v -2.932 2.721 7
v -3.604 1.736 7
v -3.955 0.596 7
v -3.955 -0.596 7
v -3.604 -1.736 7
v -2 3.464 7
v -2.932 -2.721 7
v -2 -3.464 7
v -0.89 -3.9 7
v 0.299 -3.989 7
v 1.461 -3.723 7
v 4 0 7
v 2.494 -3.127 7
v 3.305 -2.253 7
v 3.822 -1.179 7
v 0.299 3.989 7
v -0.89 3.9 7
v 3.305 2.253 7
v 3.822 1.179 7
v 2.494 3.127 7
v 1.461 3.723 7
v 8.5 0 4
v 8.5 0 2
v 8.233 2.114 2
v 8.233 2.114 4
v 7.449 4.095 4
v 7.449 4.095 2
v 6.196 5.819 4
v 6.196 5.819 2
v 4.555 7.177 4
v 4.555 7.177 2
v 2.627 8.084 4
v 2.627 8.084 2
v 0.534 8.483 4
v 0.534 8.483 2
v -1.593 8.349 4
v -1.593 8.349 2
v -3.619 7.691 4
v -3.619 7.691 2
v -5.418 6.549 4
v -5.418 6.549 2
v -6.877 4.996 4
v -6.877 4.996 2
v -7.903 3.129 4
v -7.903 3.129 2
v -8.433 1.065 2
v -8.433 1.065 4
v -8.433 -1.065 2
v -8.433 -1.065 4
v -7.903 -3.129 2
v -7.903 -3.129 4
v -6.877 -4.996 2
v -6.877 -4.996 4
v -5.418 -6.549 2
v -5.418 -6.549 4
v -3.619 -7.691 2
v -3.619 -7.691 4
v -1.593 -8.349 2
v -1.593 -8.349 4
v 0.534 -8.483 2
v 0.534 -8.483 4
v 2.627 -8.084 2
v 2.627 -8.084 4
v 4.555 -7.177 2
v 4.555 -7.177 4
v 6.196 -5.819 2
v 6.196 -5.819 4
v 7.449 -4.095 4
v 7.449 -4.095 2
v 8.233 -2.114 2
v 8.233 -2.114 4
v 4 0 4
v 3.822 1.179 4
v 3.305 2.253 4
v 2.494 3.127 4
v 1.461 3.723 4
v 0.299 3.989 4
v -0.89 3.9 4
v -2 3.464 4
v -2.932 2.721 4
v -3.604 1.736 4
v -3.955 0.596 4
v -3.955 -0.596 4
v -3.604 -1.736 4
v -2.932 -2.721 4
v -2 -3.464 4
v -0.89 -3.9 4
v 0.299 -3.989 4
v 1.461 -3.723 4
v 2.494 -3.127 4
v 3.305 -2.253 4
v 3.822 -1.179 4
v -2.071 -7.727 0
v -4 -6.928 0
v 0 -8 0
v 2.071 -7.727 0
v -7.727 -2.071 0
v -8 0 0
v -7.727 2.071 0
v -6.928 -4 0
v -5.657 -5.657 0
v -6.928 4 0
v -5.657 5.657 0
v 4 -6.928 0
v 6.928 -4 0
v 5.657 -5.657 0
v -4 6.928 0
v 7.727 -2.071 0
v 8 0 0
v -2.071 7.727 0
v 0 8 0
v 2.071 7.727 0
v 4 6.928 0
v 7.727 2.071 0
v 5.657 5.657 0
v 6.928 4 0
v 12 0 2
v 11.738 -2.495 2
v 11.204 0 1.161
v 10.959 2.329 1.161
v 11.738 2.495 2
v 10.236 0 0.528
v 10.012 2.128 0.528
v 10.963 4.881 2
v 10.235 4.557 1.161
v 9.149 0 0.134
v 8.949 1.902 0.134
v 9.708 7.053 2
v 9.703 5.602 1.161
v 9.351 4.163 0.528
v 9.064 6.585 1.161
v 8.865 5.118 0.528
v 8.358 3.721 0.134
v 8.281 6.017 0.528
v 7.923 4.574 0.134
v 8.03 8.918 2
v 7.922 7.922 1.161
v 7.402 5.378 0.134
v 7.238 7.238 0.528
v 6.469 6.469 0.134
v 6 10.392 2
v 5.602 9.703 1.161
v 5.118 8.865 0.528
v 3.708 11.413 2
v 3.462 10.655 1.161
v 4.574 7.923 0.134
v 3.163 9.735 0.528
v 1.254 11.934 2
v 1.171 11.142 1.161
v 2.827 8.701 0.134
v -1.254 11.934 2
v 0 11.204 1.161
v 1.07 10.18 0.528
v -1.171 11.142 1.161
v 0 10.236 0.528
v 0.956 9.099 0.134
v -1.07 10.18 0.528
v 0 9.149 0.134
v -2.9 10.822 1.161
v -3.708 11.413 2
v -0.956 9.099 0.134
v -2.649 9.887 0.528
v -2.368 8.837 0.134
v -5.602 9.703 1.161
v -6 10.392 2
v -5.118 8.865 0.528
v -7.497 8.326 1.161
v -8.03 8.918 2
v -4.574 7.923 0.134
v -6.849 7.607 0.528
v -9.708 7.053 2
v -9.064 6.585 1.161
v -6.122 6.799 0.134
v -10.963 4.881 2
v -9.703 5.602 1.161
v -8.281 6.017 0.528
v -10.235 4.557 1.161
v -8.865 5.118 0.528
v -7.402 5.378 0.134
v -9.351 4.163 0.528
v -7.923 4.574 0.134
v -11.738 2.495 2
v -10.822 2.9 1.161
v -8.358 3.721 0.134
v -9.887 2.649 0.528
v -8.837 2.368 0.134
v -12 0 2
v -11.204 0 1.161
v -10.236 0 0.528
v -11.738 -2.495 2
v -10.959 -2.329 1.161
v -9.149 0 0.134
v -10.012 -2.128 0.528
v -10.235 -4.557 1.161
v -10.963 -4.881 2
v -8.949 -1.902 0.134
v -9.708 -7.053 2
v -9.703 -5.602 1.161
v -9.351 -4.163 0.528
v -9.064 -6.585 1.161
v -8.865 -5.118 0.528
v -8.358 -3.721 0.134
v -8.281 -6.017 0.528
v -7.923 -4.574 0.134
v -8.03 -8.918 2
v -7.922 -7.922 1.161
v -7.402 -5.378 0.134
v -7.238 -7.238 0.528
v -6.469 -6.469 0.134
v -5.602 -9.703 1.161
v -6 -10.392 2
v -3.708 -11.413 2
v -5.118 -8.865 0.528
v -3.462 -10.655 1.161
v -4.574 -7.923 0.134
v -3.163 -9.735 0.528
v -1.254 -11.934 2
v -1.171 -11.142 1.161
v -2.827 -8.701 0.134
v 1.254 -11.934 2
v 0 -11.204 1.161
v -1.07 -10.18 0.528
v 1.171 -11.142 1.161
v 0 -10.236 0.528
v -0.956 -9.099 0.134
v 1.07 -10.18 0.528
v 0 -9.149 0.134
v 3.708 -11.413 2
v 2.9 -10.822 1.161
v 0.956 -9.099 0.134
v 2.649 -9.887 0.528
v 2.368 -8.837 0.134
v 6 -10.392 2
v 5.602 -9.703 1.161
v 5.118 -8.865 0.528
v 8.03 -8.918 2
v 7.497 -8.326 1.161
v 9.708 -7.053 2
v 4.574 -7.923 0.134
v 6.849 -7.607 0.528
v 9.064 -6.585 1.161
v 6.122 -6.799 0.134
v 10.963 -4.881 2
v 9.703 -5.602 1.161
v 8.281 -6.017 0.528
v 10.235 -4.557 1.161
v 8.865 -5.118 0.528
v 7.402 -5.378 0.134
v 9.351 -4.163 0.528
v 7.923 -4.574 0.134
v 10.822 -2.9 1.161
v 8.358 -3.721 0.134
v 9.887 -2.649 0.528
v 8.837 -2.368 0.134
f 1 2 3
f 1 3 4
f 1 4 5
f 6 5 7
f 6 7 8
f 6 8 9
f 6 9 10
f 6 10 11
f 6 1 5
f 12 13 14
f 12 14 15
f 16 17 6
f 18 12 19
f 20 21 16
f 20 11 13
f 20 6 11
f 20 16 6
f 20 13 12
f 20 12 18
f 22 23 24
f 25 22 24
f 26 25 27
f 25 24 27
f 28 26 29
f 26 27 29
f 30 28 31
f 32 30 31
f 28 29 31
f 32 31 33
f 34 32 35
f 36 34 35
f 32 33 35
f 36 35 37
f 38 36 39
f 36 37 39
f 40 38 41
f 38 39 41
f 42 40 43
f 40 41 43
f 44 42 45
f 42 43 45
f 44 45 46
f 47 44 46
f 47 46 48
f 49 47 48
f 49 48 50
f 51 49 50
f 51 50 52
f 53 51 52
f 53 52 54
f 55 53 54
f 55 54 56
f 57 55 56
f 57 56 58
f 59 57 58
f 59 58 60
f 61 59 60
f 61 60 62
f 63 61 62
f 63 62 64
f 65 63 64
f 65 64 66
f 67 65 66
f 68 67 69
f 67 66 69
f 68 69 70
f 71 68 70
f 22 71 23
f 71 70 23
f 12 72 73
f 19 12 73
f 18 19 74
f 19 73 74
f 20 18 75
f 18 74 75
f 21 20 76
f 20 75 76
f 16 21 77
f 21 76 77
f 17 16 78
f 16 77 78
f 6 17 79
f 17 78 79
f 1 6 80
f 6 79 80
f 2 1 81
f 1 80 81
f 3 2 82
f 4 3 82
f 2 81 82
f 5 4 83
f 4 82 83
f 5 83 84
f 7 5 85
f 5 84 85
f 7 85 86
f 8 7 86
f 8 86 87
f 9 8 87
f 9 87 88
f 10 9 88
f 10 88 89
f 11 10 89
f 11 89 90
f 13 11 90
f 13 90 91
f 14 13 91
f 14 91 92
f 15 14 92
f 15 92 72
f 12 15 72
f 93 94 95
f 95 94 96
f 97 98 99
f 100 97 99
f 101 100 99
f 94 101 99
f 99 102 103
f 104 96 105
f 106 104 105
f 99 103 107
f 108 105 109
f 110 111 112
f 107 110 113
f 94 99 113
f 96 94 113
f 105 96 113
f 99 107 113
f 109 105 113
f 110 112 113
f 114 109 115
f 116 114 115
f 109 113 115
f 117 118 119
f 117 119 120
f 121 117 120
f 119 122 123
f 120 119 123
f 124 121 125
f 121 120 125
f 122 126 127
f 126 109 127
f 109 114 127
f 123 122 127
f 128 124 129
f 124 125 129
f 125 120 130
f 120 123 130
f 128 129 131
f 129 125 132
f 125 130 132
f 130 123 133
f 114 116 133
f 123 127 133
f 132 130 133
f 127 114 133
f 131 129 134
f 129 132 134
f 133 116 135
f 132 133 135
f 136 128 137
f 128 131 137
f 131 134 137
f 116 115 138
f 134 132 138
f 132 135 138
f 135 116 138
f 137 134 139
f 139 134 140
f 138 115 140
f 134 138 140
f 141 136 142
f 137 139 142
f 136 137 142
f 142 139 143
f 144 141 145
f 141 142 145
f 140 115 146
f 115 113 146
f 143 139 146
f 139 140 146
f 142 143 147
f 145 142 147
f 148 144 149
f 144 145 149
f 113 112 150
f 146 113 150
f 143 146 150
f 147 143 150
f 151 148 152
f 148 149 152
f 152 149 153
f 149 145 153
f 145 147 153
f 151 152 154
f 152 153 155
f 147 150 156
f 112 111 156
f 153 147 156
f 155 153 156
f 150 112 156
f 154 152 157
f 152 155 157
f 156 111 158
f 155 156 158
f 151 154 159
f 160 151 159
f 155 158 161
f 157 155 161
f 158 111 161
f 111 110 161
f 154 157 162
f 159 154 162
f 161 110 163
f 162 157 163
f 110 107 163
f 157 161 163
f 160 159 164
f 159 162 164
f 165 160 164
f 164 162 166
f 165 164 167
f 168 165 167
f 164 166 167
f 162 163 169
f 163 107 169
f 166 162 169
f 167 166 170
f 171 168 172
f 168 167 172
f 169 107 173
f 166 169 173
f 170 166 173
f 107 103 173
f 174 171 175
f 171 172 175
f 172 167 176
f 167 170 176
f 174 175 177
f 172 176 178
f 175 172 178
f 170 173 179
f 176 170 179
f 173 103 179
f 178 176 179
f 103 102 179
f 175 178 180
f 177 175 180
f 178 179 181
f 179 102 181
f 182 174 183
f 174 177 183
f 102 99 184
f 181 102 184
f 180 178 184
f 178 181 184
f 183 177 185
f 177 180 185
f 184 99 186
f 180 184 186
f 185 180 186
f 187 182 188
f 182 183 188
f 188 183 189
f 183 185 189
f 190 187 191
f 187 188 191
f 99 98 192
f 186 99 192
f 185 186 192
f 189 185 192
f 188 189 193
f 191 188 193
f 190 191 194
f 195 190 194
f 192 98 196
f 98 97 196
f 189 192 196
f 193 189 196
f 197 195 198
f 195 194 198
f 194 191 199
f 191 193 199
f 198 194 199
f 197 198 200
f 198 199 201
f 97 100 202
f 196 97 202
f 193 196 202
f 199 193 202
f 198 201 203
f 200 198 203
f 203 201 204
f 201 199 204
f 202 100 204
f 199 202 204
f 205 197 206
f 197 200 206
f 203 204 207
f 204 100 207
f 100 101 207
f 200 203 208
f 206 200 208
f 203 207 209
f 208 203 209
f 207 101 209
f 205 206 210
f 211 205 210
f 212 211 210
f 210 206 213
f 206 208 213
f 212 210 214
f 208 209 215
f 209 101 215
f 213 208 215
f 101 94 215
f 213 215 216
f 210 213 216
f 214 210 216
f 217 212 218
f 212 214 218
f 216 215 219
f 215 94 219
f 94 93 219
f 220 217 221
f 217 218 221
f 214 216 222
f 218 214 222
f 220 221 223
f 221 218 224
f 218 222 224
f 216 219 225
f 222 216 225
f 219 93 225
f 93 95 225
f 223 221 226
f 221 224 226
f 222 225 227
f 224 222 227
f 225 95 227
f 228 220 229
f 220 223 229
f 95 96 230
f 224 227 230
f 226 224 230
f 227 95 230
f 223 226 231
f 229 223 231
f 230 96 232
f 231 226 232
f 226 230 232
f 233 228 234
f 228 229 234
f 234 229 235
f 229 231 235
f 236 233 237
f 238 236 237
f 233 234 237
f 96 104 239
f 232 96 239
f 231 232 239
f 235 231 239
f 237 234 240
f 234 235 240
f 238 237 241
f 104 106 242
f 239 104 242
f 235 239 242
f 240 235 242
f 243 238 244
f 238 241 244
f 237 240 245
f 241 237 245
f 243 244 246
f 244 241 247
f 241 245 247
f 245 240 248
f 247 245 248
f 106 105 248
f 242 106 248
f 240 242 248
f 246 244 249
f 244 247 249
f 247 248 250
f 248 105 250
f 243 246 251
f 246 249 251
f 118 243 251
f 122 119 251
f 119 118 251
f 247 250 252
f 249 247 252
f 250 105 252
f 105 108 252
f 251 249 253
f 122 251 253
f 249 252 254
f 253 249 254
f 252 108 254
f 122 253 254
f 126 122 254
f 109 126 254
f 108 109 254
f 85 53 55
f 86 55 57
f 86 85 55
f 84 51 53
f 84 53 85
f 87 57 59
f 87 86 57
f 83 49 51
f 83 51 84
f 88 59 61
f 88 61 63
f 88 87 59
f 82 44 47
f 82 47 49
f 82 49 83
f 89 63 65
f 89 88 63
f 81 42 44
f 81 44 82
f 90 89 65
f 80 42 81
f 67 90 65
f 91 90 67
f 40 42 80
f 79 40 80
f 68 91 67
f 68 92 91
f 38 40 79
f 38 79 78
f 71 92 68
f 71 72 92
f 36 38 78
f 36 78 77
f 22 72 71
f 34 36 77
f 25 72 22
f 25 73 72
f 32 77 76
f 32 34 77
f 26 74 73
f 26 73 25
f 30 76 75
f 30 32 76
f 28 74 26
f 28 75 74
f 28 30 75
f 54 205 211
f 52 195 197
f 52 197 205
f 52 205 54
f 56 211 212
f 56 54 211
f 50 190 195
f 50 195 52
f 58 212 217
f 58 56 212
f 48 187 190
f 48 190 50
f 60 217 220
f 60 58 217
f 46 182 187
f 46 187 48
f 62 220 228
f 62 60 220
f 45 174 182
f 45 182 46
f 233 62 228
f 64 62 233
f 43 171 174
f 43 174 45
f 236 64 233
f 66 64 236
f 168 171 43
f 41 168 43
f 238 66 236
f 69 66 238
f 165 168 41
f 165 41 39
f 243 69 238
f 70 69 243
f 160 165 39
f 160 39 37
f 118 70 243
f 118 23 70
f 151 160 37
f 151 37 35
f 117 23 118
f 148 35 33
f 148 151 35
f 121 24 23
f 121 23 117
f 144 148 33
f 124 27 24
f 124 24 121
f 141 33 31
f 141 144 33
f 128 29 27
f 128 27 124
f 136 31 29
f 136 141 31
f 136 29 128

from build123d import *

# Parameters (mm, degrees)
F0_R     = 12
F0_R_2   = 8.5
F1_DEPTH = 2
F0_R_3   = 4
F2_DEPTH = 4
F3_DEPTH = 7


# Not quite as in the source:
# - a fillet or chamfer that OpenCascade refuses, or shapes differently, is made with other operations: its cross-section is extruded or revolved along the edge and cut away or added


with BuildPart() as f1:
    # F0 (on Top) → F1 (new body)
    with BuildSketch(Plane.XY):
        Circle(F0_R)
        Circle(F0_R_2, mode=Mode.SUBTRACT)
    extrude(amount=F1_DEPTH)

    # F0 (on Top) → F2 (join)
    with BuildSketch(Plane.XY):
        Circle(F0_R_2)
        Circle(F0_R_3, mode=Mode.SUBTRACT)
    extrude(amount=F2_DEPTH)

    # F0 (on Top) → F3 (join)
    with BuildSketch(Plane.XY):
        Circle(F0_R_3)
    extrude(amount=F3_DEPTH)

    # F4: fillet of radius 5 on 1 edges, made by hand

    # F4_s1 → F4_t2 (revolve, cut)
    with BuildSketch(Plane.XZ):
        with BuildLine():
            ThreePointArc((12, 2), (10.2360679775, 0.527864045), (8, 0))
            Line((8, 0), (12, 0))
            Line((12, 0), (12, 2))
        make_face()
    revolve(axis=Axis((0, 0, 0), (0, 0, 1)), mode=Mode.SUBTRACT)


solid = f1.part
